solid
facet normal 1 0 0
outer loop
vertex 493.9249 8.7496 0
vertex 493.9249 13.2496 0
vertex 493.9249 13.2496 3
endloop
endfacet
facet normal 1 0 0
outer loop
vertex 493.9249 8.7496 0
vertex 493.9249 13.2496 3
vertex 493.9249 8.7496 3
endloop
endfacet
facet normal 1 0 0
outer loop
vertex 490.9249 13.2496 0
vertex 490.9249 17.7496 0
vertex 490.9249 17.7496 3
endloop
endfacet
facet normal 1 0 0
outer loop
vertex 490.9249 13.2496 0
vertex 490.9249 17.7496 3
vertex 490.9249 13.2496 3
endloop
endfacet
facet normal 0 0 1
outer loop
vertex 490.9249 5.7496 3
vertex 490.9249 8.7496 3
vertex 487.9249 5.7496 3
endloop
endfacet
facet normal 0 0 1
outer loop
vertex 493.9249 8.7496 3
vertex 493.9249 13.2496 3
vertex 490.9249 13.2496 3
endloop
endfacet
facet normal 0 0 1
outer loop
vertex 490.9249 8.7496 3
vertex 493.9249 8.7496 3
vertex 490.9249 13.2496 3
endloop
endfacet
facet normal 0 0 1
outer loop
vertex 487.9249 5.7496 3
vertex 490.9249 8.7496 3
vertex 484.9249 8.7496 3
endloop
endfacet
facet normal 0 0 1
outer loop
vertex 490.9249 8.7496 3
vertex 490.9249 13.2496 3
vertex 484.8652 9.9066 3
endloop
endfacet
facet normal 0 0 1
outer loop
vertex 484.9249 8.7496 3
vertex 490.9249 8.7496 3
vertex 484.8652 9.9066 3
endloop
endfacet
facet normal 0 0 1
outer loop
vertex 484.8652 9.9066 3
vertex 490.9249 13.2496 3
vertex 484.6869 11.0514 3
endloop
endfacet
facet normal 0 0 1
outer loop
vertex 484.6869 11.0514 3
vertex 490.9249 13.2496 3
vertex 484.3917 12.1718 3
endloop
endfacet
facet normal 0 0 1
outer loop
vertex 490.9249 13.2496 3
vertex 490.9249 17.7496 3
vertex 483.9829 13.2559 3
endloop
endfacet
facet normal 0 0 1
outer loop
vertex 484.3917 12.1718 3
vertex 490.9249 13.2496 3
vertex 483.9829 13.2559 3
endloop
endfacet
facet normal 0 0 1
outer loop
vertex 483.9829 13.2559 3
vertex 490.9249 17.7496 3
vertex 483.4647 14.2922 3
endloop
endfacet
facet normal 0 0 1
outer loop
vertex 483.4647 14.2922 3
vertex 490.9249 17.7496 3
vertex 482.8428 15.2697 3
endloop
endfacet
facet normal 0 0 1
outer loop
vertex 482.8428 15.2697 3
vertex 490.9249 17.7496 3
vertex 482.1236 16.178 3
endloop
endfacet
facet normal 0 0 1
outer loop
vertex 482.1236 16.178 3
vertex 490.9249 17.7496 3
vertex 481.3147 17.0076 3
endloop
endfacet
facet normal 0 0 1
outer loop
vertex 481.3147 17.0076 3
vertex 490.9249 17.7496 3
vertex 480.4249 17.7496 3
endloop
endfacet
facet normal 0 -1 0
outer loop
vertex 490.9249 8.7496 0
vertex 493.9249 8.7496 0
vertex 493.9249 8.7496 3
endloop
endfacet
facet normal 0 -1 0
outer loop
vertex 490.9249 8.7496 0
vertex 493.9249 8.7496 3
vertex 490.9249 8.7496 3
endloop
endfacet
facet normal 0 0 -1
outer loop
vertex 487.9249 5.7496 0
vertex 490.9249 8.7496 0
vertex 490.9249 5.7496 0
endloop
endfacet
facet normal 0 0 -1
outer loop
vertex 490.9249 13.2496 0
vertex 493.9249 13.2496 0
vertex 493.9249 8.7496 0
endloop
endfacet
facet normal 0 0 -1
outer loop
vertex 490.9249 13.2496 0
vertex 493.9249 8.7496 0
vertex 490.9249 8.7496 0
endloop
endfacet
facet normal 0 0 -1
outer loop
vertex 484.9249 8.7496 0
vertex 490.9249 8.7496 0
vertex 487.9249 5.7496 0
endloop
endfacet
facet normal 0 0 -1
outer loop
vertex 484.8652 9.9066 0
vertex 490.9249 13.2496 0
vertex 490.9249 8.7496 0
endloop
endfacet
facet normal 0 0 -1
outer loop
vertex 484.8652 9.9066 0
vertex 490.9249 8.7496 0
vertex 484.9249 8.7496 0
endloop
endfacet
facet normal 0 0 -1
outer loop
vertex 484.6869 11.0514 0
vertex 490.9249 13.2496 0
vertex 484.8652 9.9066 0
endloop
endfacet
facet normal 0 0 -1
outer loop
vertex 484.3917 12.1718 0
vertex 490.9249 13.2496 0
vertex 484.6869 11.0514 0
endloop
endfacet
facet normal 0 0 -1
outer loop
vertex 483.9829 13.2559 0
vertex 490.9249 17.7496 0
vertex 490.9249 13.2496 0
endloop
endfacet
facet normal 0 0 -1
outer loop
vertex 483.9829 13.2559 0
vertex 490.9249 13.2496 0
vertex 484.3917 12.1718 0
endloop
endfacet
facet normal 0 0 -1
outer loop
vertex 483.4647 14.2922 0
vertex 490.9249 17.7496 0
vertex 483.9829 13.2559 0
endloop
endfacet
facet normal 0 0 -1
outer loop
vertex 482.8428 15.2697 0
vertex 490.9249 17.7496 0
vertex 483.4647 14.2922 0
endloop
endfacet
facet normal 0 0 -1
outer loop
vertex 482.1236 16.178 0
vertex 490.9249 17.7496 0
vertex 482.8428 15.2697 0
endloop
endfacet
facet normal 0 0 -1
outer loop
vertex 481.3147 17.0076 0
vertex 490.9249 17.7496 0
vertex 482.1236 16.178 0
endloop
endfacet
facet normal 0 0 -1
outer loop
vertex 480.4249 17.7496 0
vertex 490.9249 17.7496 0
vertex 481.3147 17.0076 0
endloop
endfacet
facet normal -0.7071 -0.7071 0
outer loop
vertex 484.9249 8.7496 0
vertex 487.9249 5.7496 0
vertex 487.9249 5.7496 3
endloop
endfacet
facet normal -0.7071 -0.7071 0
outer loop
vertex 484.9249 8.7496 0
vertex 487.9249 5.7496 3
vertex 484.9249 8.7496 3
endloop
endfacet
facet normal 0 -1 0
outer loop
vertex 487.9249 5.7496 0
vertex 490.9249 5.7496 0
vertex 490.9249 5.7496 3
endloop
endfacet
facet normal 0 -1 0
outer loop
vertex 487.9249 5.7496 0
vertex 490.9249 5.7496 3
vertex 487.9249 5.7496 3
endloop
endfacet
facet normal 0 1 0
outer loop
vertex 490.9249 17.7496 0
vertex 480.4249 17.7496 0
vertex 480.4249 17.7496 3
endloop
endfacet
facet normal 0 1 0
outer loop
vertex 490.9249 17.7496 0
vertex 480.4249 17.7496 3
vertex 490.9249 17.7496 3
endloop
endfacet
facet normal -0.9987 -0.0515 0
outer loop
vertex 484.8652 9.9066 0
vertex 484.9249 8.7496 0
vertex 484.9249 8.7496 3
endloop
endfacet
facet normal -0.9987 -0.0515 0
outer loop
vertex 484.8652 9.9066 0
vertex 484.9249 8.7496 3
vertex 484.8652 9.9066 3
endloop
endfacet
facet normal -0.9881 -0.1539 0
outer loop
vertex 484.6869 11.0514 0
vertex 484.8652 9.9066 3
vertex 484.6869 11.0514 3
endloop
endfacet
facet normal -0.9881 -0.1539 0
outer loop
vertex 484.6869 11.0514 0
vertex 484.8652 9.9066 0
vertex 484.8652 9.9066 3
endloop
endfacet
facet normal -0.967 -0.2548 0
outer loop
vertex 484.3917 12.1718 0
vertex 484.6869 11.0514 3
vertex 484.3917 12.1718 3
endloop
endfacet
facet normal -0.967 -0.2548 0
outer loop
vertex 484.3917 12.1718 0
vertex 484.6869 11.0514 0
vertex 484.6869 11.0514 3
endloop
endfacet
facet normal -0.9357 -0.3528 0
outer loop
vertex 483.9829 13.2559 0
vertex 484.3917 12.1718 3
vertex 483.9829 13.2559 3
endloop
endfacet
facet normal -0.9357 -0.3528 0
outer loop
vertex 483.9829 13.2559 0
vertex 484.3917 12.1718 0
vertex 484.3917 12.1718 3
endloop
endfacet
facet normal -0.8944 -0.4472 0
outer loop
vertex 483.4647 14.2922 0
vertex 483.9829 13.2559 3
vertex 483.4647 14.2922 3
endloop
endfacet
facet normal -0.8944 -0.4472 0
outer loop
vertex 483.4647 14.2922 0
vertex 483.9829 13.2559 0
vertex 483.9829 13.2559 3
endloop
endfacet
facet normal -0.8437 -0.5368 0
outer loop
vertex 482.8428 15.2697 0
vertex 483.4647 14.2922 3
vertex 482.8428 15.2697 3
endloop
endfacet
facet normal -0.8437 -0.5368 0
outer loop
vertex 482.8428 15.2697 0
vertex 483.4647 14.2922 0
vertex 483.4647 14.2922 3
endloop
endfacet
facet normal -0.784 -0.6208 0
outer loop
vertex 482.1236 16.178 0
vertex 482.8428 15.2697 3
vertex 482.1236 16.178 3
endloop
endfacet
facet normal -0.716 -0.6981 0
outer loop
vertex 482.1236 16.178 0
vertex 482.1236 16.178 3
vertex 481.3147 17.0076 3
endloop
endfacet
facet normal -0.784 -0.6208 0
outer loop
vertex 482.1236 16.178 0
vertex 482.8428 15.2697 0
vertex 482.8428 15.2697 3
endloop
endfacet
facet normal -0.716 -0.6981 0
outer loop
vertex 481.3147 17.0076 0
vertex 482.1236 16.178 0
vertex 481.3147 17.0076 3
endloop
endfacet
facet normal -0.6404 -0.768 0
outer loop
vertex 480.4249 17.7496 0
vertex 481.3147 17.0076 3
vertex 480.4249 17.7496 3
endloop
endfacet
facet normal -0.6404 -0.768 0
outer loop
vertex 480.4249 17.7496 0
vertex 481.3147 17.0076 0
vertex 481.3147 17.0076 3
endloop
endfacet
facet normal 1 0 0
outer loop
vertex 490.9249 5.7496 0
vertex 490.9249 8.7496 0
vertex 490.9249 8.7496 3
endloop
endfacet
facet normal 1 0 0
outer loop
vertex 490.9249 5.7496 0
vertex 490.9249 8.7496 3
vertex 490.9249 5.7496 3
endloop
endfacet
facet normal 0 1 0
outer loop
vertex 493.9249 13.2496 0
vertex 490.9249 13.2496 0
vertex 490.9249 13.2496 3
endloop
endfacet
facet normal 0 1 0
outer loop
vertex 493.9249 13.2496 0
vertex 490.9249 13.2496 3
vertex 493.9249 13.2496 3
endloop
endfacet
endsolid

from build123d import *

# Parameters (mm, degrees)
BOSS_EXTRUDE1_DEPTH = 3


with BuildPart() as part:
    # Sketch1 → Boss-Extrude1 (new body)
    with BuildSketch(Plane.XY):
        with BuildLine():
            Line((490.924864814, 8.749554885), (490.924864814, 5.749554885))
            Line((490.924864814, 5.749554885), (487.924864814, 5.749554885))
            Line((487.924864814, 5.749554885), (484.924864814, 8.749554885))
            ThreePointArc((484.924864814, 8.749554885), (483.737170712, 13.780707835), (480.424864814, 17.749554885))
            Line((480.424864814, 17.749554885), (490.924864814, 17.749554885))
            Line((490.924864814, 17.749554885), (490.924864814, 13.249554885))
            Line((490.924864814, 13.249554885), (493.924864814, 13.249554885))
            Line((493.924864814, 13.249554885), (493.924864814, 8.749554885))
            Line((493.924864814, 8.749554885), (490.924864814, 8.749554885))
        make_face()
    extrude(amount=BOSS_EXTRUDE1_DEPTH)


solid = part.part
